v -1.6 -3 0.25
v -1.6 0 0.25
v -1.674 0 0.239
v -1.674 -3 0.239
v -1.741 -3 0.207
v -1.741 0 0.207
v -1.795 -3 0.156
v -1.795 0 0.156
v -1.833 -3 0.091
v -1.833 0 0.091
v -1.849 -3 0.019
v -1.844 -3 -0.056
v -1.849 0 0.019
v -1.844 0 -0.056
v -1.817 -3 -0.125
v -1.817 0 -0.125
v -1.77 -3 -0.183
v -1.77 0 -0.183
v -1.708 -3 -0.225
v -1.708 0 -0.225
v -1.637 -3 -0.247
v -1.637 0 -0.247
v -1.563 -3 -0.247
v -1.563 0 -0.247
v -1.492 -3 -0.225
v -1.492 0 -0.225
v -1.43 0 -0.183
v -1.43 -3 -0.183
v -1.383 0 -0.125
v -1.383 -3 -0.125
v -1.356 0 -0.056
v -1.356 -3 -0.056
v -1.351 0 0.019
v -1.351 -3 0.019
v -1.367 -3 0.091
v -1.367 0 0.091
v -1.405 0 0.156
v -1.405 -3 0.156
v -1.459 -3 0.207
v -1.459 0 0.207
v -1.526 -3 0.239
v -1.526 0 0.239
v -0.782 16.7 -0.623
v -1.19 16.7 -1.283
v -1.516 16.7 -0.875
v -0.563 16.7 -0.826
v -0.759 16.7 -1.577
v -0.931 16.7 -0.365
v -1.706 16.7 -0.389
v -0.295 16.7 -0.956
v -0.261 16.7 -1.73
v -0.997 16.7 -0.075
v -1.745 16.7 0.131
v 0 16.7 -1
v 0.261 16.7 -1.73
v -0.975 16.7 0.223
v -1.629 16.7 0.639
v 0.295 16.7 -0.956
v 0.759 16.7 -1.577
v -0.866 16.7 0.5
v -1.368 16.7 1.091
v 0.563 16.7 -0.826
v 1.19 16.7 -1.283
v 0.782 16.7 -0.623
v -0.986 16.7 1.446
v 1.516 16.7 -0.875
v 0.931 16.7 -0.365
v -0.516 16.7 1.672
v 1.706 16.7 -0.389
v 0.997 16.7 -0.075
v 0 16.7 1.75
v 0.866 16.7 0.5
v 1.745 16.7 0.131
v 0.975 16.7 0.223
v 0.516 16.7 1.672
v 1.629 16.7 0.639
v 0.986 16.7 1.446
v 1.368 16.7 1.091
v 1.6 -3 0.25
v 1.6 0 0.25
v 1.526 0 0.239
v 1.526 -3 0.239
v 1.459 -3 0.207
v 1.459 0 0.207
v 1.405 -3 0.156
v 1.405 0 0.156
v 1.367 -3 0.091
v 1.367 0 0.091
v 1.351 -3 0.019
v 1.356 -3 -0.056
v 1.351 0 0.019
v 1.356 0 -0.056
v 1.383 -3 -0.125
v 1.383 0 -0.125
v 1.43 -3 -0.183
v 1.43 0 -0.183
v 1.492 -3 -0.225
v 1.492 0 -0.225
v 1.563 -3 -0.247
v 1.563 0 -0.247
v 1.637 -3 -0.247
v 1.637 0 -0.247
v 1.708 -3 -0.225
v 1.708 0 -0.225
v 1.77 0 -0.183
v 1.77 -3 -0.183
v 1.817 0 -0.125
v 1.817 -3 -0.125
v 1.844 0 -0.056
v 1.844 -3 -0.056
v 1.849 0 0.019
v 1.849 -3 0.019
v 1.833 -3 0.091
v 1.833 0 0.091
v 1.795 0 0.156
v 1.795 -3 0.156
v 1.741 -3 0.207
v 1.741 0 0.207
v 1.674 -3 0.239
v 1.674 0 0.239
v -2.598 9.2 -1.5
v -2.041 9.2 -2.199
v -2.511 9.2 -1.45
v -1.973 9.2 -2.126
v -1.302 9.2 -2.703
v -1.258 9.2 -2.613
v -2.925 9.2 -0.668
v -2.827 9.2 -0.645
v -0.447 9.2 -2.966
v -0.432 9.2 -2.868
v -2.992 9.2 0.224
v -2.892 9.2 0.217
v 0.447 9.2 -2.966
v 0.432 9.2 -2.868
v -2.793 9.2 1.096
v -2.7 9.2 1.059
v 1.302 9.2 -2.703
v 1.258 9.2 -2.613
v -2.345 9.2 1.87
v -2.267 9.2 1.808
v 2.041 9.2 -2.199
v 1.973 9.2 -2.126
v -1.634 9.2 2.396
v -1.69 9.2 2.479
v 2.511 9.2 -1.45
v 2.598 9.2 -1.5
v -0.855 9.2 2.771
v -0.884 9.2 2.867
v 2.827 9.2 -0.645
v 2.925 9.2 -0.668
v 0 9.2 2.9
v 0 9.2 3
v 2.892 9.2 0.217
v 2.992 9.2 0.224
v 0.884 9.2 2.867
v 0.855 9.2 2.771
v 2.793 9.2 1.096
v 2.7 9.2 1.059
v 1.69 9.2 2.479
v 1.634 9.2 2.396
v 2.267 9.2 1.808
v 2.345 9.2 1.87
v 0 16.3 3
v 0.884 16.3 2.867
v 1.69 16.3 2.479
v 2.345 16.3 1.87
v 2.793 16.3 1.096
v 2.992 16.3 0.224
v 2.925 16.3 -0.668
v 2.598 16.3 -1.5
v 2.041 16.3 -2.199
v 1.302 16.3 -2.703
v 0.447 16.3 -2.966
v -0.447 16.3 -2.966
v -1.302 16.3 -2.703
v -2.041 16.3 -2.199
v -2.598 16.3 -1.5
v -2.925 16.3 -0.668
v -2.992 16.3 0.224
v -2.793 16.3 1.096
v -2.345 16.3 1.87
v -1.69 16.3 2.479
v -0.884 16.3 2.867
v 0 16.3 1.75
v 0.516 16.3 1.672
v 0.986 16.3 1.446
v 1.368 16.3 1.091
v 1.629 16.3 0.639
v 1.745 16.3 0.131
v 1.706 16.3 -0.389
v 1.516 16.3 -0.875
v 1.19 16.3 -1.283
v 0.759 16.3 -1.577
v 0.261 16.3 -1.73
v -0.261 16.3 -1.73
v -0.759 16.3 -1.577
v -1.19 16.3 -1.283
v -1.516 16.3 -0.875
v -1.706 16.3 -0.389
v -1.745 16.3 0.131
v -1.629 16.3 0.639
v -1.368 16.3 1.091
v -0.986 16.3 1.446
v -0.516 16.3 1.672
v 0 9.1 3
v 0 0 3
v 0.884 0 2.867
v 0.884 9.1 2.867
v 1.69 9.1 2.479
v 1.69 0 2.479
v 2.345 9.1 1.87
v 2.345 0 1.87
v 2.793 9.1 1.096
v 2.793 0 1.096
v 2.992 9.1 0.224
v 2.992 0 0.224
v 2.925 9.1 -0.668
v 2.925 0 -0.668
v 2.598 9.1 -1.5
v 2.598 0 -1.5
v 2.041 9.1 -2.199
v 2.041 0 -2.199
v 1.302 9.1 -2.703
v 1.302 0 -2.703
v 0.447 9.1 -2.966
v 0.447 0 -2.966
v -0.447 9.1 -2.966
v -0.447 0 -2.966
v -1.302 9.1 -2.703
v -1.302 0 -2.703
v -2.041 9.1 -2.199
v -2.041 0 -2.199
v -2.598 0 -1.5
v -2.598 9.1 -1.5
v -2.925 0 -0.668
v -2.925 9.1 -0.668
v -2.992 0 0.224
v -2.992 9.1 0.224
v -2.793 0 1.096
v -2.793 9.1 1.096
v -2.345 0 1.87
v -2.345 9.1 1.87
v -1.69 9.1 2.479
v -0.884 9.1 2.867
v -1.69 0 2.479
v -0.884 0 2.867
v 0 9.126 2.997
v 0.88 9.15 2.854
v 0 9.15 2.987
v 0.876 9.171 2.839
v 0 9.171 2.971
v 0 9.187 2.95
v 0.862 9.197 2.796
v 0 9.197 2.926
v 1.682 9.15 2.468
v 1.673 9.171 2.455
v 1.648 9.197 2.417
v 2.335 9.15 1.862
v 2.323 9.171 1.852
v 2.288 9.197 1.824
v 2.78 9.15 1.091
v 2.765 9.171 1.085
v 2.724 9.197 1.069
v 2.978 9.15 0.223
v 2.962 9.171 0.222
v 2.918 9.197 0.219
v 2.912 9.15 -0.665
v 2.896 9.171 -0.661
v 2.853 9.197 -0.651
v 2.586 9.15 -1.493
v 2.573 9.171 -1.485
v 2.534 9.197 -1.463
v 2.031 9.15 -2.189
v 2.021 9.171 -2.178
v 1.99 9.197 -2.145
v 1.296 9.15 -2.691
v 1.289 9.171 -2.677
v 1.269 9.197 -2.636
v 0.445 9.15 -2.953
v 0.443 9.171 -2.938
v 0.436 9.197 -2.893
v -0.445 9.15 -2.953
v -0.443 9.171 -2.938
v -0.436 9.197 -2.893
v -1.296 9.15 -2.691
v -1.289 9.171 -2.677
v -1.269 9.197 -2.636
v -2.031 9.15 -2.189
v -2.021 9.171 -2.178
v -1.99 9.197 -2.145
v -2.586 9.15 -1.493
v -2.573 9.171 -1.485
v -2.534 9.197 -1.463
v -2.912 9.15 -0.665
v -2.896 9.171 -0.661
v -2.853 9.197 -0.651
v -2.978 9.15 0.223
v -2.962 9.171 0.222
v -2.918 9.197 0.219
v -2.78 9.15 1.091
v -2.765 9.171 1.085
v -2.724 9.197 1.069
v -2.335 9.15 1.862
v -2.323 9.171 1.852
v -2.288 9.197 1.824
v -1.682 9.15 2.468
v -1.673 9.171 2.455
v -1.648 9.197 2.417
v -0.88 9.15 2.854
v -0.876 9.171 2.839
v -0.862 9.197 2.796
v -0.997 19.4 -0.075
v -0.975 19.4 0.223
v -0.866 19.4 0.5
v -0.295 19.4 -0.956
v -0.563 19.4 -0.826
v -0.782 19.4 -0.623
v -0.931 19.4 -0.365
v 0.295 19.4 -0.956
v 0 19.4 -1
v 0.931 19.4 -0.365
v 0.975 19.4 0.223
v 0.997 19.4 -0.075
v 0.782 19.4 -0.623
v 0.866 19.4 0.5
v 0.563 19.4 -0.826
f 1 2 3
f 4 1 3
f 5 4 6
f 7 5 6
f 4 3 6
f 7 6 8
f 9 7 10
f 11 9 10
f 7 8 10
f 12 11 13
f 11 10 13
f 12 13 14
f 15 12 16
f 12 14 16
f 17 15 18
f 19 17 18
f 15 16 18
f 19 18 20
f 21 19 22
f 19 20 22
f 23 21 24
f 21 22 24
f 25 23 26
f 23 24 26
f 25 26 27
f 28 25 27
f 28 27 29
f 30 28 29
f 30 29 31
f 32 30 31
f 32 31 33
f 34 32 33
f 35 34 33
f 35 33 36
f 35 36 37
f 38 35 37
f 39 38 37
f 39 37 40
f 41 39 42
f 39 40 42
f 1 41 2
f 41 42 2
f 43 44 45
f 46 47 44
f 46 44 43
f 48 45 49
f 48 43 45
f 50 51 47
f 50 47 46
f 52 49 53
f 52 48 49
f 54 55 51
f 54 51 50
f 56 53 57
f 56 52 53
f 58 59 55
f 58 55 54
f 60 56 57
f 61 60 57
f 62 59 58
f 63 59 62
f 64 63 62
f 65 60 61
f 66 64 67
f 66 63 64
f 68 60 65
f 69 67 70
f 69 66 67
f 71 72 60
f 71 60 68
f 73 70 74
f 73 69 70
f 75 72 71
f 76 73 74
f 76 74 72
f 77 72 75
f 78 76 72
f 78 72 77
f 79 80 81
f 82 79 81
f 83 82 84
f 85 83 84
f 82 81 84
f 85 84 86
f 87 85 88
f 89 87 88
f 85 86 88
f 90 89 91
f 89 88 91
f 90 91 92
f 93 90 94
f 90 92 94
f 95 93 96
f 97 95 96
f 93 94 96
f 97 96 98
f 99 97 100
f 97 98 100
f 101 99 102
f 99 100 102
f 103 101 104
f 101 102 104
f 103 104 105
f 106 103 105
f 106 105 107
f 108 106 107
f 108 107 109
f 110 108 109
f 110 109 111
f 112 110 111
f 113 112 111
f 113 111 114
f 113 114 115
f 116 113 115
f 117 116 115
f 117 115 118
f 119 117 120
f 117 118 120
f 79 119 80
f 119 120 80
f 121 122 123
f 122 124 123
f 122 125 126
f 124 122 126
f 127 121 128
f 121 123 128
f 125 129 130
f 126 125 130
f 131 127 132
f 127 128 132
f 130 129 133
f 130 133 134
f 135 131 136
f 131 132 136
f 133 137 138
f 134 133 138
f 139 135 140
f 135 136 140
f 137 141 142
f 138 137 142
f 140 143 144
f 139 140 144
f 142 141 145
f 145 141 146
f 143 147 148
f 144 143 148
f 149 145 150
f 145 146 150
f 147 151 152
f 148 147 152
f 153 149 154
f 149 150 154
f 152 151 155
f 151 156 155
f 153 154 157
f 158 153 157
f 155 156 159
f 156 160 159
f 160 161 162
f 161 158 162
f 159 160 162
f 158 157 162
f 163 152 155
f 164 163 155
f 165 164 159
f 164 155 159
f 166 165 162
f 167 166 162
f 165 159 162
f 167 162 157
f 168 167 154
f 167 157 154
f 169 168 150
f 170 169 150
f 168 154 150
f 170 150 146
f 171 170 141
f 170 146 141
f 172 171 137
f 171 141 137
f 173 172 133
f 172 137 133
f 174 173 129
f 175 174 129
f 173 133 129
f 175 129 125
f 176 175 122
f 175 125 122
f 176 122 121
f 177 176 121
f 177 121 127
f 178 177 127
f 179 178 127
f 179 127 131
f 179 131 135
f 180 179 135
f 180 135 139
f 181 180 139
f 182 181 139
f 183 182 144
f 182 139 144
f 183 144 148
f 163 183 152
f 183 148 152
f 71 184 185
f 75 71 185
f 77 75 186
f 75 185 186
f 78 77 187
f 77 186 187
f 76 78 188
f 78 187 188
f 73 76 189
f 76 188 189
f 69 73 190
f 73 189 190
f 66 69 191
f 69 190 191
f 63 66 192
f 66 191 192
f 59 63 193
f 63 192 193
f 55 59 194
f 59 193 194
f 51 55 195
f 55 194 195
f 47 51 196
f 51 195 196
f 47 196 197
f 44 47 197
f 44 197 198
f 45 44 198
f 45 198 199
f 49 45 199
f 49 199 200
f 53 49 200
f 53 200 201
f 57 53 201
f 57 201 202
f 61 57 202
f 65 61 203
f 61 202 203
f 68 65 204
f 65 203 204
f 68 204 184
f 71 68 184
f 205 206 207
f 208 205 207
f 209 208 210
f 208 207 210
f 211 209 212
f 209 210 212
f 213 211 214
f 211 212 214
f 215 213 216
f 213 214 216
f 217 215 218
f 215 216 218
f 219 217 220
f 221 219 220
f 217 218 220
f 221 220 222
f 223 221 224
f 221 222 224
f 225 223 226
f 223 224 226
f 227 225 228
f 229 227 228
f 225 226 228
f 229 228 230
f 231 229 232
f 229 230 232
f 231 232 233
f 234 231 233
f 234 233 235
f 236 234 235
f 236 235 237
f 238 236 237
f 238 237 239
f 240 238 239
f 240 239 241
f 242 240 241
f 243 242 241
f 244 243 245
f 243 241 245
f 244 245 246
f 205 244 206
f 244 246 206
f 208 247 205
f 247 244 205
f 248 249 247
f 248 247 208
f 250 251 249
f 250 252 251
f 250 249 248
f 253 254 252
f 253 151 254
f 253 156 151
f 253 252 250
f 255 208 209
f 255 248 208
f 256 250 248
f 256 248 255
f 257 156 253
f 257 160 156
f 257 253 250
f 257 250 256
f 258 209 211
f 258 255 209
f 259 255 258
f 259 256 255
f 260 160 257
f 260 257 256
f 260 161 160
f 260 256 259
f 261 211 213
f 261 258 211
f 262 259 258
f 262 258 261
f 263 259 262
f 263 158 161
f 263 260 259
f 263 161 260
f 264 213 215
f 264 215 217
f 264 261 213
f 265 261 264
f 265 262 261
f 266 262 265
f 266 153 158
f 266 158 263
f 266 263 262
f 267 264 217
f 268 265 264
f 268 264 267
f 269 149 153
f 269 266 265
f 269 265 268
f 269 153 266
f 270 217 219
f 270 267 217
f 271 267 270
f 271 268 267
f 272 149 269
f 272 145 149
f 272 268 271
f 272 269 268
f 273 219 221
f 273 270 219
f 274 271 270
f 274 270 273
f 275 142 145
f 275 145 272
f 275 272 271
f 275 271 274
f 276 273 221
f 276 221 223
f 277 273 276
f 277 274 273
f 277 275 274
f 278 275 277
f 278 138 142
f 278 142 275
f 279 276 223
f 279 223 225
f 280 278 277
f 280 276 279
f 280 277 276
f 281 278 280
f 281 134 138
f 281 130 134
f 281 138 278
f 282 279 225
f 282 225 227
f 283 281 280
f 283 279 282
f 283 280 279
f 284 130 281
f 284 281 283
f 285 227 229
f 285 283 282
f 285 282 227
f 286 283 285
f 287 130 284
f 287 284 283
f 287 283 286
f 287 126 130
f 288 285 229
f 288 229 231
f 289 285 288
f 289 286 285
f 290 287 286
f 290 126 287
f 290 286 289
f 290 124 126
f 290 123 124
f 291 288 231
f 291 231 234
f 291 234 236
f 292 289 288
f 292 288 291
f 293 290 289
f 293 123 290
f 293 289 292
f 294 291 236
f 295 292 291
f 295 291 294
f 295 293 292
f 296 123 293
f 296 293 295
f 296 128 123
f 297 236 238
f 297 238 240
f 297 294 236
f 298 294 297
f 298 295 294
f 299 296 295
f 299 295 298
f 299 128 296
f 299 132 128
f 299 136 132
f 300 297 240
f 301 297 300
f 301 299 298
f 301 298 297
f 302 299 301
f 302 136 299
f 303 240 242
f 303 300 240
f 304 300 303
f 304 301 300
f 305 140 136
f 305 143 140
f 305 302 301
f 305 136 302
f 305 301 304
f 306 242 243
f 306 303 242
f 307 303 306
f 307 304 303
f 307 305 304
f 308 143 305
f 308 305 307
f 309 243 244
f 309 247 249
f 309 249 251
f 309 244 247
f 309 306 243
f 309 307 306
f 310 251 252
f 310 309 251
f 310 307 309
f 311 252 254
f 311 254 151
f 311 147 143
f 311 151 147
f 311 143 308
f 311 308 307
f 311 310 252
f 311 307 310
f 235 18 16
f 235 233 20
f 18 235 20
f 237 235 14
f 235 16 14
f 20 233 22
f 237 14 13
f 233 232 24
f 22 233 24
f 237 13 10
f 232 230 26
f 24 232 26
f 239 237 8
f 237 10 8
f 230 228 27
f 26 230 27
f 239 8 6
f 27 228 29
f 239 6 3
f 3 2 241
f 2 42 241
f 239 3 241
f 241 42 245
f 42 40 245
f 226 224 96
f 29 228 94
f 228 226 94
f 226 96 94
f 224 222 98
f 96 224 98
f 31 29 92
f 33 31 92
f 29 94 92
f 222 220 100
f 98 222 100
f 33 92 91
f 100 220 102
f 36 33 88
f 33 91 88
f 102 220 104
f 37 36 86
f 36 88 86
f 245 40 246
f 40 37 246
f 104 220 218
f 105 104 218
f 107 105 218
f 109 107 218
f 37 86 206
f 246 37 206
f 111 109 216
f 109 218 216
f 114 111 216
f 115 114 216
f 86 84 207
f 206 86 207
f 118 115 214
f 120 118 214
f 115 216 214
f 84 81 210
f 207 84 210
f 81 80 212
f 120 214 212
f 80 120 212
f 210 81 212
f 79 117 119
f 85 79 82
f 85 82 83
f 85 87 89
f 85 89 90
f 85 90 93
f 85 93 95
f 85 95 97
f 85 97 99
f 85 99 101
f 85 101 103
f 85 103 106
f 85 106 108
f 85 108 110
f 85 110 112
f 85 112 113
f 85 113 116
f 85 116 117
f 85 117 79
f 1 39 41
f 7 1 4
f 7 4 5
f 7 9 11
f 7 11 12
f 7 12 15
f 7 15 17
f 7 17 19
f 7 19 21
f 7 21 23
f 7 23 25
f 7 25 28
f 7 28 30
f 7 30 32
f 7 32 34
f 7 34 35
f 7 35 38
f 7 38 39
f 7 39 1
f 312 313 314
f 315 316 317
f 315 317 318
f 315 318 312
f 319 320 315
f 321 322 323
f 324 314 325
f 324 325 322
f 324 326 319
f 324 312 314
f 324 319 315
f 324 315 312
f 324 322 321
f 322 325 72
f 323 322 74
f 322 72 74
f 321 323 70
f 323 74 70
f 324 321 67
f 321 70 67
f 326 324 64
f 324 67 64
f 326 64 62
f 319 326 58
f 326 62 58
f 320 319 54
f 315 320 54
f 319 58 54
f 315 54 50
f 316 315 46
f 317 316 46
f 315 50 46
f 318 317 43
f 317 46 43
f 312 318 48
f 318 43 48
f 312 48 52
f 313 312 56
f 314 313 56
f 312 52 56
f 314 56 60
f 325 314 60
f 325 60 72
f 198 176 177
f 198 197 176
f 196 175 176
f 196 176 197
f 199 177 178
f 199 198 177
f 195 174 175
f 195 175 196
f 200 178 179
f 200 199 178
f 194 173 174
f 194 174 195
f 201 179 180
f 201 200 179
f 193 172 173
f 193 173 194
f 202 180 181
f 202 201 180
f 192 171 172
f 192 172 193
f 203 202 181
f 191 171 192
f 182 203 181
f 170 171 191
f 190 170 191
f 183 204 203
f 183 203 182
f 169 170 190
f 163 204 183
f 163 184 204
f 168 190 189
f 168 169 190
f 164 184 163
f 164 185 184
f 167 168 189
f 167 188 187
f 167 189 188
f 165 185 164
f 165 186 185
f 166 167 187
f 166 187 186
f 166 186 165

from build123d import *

# Parameters (mm, degrees)
SKETCH1_R           = 3
BOSS_EXTRUDE1_DEPTH = 9.2
FILLET1_R           = 0.1
SKETCH4_R           = 3
BOSS_EXTRUDE4_DEPTH = 7.1
SKETCH6_R           = 1.75
BOSS_EXTRUDE6_DEPTH = 0.4
BOSS_EXTRUDE5_DEPTH = 3.1
SKETCH7_R           = 0.25
BOSS_EXTRUDE7_DEPTH = 3


with BuildPart() as part:
    # Sketch1 → Boss-Extrude1 (new body)
    with BuildSketch(Plane(origin=(0, 0, 0), x_dir=(1, 0, 0), z_dir=(0, 1, 0))):
        with Locations(Location((0, 0, 0), (0, 0, 270))):
            Circle(SKETCH1_R)
    extrude(amount=BOSS_EXTRUDE1_DEPTH)

    # Fillet1
    fillet1_edges = [part.edges().sort_by_distance(p)[0] for p in [
        (0, 9.2, -3),
    ]]
    fillet(fillet1_edges, radius=FILLET1_R)

    # Sketch4 → Boss-Extrude4 (add)
    with BuildSketch(Plane(origin=(0, 9.2, 0), x_dir=(1, 0, 0), z_dir=(0, 1, 0))):
        with Locations(Location((0, 0, 0), (0, 0, 270))):
            Circle(SKETCH4_R)
    extrude(amount=BOSS_EXTRUDE4_DEPTH)

    # Sketch6 → Boss-Extrude6 (add)
    with BuildSketch(Plane(origin=(0, 16.3, 0), x_dir=(1, 0, 0), z_dir=(0, 1, 0))):
        with Locations(Location((0, 0, 0), (0, 0, 270))):
            Circle(SKETCH6_R)
    extrude(amount=BOSS_EXTRUDE6_DEPTH)

    # Sketch5 → Boss-Extrude5 (add)
    with BuildSketch(Plane(origin=(0, 16.3, 0), x_dir=(1, 0, 0), z_dir=(0, 1, 0))):
        with BuildLine():
            Line((-0.866025404, -0.5), (0, -0.5))
            Line((0, -0.5), (0.866025404, -0.5))
            ThreePointArc((0.866025404, -0.5), (0, 1), (-0.866025404, -0.5))
        make_face()
    extrude(amount=BOSS_EXTRUDE5_DEPTH)

    # Sketch7 → Boss-Extrude7 (add)
    with BuildSketch(Plane.XZ):
        with Locations(Location((-1.6, 0, 0), (0, 0, 90))):
            Circle(SKETCH7_R)
        with Locations(Location((1.6, 0, 0), (0, 0, 90))):
            Circle(SKETCH7_R)
    extrude(amount=BOSS_EXTRUDE7_DEPTH)


solid = part.part
